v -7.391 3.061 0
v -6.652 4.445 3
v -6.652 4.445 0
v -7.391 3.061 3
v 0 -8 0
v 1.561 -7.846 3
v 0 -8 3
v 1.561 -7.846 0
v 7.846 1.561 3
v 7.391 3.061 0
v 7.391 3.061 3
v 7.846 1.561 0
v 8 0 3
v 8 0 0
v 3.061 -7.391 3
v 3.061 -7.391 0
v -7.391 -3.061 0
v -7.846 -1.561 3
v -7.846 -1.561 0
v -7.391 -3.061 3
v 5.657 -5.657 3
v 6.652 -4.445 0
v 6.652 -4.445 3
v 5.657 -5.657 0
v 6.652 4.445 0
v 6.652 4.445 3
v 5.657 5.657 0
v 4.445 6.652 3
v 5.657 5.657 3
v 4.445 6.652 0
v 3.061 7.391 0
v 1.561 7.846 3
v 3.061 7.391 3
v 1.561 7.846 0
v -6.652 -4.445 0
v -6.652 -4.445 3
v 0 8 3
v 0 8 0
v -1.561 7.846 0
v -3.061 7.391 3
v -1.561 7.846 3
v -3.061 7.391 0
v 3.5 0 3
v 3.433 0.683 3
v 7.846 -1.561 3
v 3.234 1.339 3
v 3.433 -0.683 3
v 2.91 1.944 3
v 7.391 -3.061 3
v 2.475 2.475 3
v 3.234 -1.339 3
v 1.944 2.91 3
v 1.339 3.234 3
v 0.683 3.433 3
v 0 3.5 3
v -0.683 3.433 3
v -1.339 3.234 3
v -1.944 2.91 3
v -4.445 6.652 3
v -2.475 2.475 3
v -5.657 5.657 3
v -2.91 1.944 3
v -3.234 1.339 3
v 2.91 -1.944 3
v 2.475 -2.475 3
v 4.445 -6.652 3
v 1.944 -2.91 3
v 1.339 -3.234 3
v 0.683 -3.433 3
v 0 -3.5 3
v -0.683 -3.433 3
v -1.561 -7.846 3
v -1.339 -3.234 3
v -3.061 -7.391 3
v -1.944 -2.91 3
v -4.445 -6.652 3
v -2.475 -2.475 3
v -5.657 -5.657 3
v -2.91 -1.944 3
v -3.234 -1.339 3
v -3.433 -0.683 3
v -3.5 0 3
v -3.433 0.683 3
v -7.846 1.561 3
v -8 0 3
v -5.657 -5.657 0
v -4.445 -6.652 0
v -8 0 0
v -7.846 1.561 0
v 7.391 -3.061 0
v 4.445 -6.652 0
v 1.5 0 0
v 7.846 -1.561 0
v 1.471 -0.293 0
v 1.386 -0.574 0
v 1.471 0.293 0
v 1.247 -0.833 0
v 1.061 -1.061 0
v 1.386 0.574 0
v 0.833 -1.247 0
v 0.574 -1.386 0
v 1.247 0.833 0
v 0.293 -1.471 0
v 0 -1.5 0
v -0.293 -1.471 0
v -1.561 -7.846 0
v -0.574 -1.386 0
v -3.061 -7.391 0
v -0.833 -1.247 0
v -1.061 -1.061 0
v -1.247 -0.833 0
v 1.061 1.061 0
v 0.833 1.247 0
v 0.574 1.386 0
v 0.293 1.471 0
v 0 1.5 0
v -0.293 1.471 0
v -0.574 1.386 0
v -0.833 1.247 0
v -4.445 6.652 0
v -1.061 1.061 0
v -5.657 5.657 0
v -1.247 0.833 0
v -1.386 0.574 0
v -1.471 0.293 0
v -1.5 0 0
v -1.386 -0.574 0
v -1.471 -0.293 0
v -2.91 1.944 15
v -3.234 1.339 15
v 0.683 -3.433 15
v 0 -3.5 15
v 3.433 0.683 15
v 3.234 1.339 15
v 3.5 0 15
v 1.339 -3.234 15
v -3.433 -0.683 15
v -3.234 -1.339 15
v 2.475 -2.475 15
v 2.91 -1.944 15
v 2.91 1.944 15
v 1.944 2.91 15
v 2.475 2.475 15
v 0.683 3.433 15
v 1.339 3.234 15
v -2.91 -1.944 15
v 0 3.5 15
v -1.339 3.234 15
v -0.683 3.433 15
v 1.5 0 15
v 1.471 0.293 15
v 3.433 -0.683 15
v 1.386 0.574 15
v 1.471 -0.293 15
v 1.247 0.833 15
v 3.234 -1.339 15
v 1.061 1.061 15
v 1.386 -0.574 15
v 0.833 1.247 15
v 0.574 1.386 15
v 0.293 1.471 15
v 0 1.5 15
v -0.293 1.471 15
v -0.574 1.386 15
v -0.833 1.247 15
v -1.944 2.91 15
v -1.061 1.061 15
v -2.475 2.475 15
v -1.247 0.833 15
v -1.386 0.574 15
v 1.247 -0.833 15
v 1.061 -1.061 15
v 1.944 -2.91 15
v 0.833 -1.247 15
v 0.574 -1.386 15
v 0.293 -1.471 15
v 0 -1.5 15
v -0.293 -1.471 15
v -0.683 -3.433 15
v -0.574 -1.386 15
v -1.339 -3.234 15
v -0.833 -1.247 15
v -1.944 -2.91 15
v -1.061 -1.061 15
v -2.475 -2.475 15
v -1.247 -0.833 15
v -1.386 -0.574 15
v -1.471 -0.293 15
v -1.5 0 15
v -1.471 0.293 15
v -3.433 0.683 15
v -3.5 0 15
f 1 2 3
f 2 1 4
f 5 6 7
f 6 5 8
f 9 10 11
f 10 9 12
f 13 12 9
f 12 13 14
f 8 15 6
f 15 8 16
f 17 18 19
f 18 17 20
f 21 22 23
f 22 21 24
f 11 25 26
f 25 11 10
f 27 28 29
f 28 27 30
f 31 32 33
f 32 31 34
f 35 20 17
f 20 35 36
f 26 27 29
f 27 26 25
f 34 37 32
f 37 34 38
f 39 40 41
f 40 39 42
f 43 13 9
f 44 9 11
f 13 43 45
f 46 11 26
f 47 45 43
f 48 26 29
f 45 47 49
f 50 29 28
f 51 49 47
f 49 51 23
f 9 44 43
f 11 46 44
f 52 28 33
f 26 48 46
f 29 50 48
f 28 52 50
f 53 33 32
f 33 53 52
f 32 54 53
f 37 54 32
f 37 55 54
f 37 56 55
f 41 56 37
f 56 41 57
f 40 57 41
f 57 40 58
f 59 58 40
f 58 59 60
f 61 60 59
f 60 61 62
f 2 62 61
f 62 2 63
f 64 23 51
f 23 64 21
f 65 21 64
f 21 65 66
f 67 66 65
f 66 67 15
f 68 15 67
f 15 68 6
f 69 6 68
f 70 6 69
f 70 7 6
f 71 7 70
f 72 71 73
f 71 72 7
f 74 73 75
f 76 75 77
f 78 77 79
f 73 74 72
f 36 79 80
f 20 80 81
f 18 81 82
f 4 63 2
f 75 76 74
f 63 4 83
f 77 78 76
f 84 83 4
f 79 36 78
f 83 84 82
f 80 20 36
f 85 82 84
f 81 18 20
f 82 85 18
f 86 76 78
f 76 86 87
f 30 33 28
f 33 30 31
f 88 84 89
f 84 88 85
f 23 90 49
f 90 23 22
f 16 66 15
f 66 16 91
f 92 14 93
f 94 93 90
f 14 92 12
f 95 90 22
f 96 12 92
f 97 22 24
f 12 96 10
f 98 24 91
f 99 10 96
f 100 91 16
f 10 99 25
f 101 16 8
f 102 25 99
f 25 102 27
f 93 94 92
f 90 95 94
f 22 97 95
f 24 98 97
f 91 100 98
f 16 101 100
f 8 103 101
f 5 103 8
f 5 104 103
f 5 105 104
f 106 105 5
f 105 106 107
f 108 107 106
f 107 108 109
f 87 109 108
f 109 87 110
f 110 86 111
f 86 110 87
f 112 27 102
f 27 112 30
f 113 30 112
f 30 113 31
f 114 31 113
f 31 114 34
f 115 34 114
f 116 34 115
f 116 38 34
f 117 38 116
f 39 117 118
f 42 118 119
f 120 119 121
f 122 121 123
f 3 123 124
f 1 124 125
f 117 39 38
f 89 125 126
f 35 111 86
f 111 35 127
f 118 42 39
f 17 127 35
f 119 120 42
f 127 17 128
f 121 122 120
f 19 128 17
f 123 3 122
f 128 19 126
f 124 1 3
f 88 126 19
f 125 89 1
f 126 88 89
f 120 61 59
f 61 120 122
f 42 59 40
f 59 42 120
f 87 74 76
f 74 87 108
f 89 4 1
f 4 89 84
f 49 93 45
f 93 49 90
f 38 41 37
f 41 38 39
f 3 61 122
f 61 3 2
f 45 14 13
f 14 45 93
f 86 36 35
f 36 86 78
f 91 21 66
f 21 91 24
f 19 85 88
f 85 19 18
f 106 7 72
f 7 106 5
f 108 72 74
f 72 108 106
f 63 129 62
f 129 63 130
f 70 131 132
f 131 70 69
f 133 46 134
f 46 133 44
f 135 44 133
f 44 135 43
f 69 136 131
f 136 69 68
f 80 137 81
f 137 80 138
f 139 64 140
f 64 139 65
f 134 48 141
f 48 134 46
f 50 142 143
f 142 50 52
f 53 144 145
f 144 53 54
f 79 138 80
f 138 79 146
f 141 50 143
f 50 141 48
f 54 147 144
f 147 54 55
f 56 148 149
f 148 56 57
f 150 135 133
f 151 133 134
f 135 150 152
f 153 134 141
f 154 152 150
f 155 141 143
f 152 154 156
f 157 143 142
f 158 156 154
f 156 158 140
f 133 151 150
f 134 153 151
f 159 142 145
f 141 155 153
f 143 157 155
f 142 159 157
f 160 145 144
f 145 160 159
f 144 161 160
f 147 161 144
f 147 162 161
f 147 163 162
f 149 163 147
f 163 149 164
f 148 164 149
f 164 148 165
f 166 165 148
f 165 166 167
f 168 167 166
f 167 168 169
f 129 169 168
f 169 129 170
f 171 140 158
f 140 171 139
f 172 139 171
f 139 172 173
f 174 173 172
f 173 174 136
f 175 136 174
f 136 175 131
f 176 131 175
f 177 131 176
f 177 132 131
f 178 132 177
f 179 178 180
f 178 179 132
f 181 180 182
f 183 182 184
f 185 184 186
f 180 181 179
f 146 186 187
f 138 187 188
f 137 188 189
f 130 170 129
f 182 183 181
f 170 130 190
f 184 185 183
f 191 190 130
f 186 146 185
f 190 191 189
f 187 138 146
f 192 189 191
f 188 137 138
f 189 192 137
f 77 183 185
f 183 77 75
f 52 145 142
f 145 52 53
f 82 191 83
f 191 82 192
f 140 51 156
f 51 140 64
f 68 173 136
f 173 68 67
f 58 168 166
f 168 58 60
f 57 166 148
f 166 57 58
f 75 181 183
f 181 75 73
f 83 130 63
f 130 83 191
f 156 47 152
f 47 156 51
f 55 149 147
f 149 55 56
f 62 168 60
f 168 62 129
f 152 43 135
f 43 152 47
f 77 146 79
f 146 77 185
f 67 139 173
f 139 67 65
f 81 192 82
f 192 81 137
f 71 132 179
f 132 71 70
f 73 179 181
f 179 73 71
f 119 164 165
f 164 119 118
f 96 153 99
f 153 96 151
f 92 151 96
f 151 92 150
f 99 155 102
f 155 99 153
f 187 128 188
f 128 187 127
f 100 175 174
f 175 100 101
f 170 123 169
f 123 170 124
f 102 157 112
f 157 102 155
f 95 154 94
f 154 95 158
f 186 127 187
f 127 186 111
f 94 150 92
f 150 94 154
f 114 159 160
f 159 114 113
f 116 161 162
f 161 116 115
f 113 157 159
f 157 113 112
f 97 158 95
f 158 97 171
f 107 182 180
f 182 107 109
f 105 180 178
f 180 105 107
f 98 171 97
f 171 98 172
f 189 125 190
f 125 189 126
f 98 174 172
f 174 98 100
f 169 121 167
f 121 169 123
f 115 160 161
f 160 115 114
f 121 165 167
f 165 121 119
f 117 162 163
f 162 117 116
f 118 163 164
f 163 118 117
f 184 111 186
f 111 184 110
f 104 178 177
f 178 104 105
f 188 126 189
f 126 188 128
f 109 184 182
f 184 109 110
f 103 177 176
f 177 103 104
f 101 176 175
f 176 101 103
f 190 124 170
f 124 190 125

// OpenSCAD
$fn = 32;

// ----------------------------------------------------------------------
// Micro post: flanged post, 5-20 mm class
// ----------------------------------------------------------------------

// --- parameters (mm) ---
post_d = 7;               // post diameter
post_h = 12;              // post height above the flange
flange_d = 16;            // flange diameter
flange_t = 3;             // flange thickness
bore_d = 3;               // through bore
fit_tol = 0.05;           // tolerance for press fits, mm
free_tol = 0.2;           // tolerance for clearance fits, mm

total_h = post_h + flange_t;  // overall height

difference() {
  union() {
    cylinder(h = flange_t, d = flange_d);
    translate([0, 0, flange_t]) cylinder(h = post_h, d = post_d);
  }
  translate([0, 0, -1]) cylinder(h = total_h + 2, d = bore_d);
}
